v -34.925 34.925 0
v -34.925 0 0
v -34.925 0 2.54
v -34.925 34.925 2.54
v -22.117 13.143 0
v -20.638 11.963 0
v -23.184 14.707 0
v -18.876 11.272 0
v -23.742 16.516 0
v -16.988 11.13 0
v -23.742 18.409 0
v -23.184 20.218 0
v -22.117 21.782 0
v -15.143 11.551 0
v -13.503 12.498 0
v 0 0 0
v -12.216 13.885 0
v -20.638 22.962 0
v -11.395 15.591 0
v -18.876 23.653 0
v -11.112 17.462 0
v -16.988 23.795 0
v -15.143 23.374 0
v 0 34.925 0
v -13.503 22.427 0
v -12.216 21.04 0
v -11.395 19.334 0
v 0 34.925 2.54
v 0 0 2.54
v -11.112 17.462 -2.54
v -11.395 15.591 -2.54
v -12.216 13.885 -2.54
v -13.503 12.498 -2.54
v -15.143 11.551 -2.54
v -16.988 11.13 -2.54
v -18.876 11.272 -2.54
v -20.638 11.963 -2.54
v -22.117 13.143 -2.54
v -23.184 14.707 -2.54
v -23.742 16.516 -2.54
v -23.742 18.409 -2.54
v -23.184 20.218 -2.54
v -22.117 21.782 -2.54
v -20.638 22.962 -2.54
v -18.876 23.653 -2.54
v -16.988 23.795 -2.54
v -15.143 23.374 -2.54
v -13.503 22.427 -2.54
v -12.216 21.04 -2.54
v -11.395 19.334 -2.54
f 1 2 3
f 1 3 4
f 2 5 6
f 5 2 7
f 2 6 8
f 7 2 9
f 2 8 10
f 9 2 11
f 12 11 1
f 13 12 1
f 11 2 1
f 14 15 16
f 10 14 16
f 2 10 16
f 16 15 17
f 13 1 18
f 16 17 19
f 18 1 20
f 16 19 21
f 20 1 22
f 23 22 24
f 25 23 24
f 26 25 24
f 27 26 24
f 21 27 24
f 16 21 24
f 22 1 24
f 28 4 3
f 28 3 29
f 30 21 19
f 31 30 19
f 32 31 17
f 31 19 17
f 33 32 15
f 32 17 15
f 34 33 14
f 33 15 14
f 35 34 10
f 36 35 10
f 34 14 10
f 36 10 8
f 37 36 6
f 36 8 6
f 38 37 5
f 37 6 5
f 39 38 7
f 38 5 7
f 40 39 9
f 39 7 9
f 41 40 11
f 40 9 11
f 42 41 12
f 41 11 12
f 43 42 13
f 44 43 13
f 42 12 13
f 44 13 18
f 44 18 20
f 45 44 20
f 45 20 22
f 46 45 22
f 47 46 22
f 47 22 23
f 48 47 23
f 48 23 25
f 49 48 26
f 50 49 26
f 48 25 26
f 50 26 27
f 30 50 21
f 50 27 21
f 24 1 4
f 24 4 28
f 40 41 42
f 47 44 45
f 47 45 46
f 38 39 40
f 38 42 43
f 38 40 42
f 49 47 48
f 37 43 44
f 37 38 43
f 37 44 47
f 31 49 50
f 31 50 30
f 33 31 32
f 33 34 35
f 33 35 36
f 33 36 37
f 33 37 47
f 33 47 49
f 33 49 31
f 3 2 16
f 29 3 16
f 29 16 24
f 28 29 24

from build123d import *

# Parameters (mm, degrees)
F0_W     = 34.925
F0_H     = 34.925
F1_DEPTH = 2.54
F2_R     = 6.35
F3_DEPTH = 2.54


with BuildPart() as f1:
    # F0 (on Top) → F1 (new body)
    with BuildSketch(Plane.XY):
        with Locations((-17.4625, 17.4625)):
            Rectangle(F0_W, F0_H)
    extrude(amount=F1_DEPTH)

    # F2 (on face) → F3 (join)
    with BuildSketch(Plane(origin=(0, 0, 0), x_dir=(1, 0, 0), z_dir=(0, 0, -1))):
        with Locations((-17.4625, -17.4625)):
            Circle(F2_R)
    extrude(amount=F3_DEPTH)


solid = f1.part
